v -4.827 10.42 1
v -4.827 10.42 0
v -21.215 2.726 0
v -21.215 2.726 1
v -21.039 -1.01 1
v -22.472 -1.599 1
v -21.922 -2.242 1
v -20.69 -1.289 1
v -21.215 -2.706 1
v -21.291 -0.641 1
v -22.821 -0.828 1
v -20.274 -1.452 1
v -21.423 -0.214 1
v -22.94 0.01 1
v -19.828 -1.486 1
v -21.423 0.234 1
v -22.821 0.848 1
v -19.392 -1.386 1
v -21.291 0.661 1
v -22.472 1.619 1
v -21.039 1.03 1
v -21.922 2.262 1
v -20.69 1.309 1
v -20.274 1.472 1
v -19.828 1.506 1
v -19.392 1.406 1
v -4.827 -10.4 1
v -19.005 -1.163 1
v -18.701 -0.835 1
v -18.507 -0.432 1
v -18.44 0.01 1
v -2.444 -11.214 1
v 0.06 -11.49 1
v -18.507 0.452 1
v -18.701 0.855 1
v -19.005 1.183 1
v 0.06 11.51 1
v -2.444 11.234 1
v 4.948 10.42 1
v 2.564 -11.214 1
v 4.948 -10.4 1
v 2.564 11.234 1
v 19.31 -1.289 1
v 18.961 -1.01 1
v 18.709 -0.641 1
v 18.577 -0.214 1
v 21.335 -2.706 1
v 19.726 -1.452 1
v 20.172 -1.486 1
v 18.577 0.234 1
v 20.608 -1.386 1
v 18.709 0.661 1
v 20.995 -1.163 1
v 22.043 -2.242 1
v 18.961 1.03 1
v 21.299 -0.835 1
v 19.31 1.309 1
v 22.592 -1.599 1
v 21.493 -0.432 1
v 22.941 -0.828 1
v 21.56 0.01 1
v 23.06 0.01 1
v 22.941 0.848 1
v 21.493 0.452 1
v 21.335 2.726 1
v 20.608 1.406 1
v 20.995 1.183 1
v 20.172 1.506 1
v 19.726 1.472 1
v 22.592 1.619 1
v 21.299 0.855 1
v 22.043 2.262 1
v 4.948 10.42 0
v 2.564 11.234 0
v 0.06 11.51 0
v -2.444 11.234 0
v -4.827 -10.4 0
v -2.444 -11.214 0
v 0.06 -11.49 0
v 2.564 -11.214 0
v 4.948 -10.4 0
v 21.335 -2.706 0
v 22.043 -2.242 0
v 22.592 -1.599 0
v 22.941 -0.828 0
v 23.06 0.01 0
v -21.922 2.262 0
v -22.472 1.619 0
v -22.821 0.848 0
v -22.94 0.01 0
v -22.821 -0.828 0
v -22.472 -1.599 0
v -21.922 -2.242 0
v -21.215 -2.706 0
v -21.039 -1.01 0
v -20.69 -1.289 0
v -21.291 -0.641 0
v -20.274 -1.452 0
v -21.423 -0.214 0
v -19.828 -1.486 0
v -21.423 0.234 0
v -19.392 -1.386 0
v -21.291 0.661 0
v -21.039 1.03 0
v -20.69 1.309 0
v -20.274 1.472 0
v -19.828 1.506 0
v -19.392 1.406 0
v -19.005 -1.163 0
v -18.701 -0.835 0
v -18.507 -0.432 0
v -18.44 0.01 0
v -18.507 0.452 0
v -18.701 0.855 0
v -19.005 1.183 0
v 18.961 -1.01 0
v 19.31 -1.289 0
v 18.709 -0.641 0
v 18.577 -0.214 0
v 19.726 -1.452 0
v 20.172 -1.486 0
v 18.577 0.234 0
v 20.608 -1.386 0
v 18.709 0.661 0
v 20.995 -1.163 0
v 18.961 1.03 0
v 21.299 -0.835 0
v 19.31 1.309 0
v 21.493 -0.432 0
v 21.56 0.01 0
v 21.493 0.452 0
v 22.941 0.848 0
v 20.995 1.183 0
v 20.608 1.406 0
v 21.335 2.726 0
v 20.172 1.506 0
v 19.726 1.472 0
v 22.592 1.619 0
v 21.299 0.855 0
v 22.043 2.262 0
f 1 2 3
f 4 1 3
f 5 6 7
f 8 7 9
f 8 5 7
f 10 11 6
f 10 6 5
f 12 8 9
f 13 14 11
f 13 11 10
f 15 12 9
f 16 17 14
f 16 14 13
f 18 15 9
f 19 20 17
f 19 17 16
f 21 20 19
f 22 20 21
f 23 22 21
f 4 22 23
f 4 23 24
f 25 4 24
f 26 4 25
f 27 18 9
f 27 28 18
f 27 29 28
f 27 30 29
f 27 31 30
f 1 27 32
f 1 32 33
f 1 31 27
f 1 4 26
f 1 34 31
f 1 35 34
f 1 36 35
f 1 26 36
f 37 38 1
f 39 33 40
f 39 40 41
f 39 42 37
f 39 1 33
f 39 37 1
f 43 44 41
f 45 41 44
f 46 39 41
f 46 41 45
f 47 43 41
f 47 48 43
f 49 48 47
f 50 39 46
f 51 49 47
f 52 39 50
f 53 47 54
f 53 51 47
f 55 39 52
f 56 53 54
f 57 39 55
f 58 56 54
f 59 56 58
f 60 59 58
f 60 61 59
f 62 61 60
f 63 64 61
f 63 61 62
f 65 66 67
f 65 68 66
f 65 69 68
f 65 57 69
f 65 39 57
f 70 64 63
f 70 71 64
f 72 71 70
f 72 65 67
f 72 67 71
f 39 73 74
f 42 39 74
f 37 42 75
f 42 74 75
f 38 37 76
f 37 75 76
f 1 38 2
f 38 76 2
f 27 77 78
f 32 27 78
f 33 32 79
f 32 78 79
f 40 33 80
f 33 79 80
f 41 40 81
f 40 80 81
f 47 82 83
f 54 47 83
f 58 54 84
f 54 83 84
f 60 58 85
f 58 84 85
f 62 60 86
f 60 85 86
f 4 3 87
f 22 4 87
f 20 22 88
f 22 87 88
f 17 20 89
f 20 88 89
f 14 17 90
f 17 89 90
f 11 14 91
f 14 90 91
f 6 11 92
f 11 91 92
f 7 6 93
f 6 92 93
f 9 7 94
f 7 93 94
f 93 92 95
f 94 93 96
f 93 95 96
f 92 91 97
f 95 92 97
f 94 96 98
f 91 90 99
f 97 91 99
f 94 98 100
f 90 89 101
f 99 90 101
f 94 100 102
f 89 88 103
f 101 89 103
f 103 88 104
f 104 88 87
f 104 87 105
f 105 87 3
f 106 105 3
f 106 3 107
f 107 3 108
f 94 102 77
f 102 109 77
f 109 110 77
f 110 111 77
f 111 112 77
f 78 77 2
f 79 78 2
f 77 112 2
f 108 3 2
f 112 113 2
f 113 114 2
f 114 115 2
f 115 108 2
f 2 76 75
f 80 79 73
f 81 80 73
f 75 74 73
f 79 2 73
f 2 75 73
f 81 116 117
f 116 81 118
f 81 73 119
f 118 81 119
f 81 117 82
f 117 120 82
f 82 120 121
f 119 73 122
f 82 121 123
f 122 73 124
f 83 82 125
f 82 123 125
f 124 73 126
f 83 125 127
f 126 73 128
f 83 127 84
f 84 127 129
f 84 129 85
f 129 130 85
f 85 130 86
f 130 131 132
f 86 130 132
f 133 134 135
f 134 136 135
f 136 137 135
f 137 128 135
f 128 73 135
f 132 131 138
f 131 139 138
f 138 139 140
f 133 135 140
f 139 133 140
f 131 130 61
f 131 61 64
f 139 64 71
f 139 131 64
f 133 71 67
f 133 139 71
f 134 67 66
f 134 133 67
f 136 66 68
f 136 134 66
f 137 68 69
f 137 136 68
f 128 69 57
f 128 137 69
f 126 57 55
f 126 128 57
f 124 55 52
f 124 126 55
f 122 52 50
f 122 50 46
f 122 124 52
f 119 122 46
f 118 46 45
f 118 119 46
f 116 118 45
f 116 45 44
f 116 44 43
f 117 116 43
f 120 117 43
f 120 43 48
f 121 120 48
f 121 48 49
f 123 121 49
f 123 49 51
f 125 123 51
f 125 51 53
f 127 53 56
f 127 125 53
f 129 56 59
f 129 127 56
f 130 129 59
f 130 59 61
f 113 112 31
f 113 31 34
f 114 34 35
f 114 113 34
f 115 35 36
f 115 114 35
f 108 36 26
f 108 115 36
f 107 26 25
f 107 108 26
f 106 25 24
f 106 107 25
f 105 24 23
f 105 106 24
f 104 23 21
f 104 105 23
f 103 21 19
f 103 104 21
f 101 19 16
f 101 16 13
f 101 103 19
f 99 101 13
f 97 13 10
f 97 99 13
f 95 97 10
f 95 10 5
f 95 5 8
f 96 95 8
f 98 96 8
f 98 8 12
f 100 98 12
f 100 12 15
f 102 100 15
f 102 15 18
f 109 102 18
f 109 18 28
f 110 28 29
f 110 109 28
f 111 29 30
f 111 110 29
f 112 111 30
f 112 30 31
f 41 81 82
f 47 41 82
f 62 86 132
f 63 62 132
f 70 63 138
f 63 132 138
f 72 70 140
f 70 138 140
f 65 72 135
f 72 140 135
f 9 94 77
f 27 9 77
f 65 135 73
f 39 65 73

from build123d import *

# Parameters (mm, degrees)
F0_R     = 1.5
F0_R_2   = 8.5
F1_DEPTH = 1


with BuildPart() as f1:
    # F0 (on Top) → F1 (new body)
    with BuildSketch(Plane.XY):
        with BuildLine():
            ThreePointArc((-16.939914, 0.01004), (-18.331343, 2.542331), (-21.214914, 2.72562))
            ThreePointArc((-21.214914, 2.72562), (-22.939914, 0.01004), (-21.214914, -2.705541))
            ThreePointArc((-21.214914, -2.705541), (-18.331343, -2.522252), (-16.939914, 0.01004))
        make_face()
        with Locations((-19.939914, 0.01004)):
            Circle(F0_R, mode=Mode.SUBTRACT)
        with BuildLine():
            ThreePointArc((-4.827414, -10.399684), (-11.439914, 0.01004), (-4.827414, 10.419763))
            Line((-4.827414, 10.419763), (-21.214914, 2.72562))
            ThreePointArc((-21.214914, 2.72562), (-18.331343, 2.542331), (-16.939914, 0.01004))
            ThreePointArc((-16.939914, 0.01004), (-18.331343, -2.522252), (-21.214914, -2.705541))
            Line((-21.214914, -2.705541), (-4.827414, -10.399684))
        make_face()
        with BuildLine():
            ThreePointArc((4.947586, -10.399684), (9.767203, -6.156149), (11.560086, 0.01004))
            ThreePointArc((11.560086, 0.01004), (9.767203, 6.176228), (4.947586, 10.419763))
            ThreePointArc((4.947586, 10.419763), (0.060086, 11.51004), (-4.827414, 10.419763))
            ThreePointArc((-4.827414, 10.419763), (-11.439914, 0.01004), (-4.827414, -10.399684))
            ThreePointArc((-4.827414, -10.399684), (0.060086, -11.48996), (4.947586, -10.399684))
        make_face()
        with Locations((0.060086, 0.01004)):
            Circle(F0_R_2, mode=Mode.SUBTRACT)
        with Locations((0.060086, 0.01004)):
            Circle(F0_R_2)
        with BuildLine():
            ThreePointArc((4.947586, 10.419763), (9.767203, 6.176228), (11.560086, 0.01004))
            ThreePointArc((11.560086, 0.01004), (9.767203, -6.156149), (4.947586, -10.399684))
            Line((4.947586, -10.399684), (21.335086, -2.705541))
            ThreePointArc((21.335086, -2.705541), (17.060086, 0.01004), (21.335086, 2.72562))
            Line((21.335086, 2.72562), (4.947586, 10.419763))
        make_face()
        with BuildLine():
            ThreePointArc((23.060086, 0.01004), (22.592377, 1.61861), (21.335086, 2.72562))
            ThreePointArc((21.335086, 2.72562), (17.060086, 0.01004), (21.335086, -2.705541))
            ThreePointArc((21.335086, -2.705541), (22.592377, -1.598531), (23.060086, 0.01004))
        make_face()
        with Locations((20.060086, 0.01004)):
            Circle(F0_R, mode=Mode.SUBTRACT)
    extrude(amount=F1_DEPTH)


solid = f1.part
